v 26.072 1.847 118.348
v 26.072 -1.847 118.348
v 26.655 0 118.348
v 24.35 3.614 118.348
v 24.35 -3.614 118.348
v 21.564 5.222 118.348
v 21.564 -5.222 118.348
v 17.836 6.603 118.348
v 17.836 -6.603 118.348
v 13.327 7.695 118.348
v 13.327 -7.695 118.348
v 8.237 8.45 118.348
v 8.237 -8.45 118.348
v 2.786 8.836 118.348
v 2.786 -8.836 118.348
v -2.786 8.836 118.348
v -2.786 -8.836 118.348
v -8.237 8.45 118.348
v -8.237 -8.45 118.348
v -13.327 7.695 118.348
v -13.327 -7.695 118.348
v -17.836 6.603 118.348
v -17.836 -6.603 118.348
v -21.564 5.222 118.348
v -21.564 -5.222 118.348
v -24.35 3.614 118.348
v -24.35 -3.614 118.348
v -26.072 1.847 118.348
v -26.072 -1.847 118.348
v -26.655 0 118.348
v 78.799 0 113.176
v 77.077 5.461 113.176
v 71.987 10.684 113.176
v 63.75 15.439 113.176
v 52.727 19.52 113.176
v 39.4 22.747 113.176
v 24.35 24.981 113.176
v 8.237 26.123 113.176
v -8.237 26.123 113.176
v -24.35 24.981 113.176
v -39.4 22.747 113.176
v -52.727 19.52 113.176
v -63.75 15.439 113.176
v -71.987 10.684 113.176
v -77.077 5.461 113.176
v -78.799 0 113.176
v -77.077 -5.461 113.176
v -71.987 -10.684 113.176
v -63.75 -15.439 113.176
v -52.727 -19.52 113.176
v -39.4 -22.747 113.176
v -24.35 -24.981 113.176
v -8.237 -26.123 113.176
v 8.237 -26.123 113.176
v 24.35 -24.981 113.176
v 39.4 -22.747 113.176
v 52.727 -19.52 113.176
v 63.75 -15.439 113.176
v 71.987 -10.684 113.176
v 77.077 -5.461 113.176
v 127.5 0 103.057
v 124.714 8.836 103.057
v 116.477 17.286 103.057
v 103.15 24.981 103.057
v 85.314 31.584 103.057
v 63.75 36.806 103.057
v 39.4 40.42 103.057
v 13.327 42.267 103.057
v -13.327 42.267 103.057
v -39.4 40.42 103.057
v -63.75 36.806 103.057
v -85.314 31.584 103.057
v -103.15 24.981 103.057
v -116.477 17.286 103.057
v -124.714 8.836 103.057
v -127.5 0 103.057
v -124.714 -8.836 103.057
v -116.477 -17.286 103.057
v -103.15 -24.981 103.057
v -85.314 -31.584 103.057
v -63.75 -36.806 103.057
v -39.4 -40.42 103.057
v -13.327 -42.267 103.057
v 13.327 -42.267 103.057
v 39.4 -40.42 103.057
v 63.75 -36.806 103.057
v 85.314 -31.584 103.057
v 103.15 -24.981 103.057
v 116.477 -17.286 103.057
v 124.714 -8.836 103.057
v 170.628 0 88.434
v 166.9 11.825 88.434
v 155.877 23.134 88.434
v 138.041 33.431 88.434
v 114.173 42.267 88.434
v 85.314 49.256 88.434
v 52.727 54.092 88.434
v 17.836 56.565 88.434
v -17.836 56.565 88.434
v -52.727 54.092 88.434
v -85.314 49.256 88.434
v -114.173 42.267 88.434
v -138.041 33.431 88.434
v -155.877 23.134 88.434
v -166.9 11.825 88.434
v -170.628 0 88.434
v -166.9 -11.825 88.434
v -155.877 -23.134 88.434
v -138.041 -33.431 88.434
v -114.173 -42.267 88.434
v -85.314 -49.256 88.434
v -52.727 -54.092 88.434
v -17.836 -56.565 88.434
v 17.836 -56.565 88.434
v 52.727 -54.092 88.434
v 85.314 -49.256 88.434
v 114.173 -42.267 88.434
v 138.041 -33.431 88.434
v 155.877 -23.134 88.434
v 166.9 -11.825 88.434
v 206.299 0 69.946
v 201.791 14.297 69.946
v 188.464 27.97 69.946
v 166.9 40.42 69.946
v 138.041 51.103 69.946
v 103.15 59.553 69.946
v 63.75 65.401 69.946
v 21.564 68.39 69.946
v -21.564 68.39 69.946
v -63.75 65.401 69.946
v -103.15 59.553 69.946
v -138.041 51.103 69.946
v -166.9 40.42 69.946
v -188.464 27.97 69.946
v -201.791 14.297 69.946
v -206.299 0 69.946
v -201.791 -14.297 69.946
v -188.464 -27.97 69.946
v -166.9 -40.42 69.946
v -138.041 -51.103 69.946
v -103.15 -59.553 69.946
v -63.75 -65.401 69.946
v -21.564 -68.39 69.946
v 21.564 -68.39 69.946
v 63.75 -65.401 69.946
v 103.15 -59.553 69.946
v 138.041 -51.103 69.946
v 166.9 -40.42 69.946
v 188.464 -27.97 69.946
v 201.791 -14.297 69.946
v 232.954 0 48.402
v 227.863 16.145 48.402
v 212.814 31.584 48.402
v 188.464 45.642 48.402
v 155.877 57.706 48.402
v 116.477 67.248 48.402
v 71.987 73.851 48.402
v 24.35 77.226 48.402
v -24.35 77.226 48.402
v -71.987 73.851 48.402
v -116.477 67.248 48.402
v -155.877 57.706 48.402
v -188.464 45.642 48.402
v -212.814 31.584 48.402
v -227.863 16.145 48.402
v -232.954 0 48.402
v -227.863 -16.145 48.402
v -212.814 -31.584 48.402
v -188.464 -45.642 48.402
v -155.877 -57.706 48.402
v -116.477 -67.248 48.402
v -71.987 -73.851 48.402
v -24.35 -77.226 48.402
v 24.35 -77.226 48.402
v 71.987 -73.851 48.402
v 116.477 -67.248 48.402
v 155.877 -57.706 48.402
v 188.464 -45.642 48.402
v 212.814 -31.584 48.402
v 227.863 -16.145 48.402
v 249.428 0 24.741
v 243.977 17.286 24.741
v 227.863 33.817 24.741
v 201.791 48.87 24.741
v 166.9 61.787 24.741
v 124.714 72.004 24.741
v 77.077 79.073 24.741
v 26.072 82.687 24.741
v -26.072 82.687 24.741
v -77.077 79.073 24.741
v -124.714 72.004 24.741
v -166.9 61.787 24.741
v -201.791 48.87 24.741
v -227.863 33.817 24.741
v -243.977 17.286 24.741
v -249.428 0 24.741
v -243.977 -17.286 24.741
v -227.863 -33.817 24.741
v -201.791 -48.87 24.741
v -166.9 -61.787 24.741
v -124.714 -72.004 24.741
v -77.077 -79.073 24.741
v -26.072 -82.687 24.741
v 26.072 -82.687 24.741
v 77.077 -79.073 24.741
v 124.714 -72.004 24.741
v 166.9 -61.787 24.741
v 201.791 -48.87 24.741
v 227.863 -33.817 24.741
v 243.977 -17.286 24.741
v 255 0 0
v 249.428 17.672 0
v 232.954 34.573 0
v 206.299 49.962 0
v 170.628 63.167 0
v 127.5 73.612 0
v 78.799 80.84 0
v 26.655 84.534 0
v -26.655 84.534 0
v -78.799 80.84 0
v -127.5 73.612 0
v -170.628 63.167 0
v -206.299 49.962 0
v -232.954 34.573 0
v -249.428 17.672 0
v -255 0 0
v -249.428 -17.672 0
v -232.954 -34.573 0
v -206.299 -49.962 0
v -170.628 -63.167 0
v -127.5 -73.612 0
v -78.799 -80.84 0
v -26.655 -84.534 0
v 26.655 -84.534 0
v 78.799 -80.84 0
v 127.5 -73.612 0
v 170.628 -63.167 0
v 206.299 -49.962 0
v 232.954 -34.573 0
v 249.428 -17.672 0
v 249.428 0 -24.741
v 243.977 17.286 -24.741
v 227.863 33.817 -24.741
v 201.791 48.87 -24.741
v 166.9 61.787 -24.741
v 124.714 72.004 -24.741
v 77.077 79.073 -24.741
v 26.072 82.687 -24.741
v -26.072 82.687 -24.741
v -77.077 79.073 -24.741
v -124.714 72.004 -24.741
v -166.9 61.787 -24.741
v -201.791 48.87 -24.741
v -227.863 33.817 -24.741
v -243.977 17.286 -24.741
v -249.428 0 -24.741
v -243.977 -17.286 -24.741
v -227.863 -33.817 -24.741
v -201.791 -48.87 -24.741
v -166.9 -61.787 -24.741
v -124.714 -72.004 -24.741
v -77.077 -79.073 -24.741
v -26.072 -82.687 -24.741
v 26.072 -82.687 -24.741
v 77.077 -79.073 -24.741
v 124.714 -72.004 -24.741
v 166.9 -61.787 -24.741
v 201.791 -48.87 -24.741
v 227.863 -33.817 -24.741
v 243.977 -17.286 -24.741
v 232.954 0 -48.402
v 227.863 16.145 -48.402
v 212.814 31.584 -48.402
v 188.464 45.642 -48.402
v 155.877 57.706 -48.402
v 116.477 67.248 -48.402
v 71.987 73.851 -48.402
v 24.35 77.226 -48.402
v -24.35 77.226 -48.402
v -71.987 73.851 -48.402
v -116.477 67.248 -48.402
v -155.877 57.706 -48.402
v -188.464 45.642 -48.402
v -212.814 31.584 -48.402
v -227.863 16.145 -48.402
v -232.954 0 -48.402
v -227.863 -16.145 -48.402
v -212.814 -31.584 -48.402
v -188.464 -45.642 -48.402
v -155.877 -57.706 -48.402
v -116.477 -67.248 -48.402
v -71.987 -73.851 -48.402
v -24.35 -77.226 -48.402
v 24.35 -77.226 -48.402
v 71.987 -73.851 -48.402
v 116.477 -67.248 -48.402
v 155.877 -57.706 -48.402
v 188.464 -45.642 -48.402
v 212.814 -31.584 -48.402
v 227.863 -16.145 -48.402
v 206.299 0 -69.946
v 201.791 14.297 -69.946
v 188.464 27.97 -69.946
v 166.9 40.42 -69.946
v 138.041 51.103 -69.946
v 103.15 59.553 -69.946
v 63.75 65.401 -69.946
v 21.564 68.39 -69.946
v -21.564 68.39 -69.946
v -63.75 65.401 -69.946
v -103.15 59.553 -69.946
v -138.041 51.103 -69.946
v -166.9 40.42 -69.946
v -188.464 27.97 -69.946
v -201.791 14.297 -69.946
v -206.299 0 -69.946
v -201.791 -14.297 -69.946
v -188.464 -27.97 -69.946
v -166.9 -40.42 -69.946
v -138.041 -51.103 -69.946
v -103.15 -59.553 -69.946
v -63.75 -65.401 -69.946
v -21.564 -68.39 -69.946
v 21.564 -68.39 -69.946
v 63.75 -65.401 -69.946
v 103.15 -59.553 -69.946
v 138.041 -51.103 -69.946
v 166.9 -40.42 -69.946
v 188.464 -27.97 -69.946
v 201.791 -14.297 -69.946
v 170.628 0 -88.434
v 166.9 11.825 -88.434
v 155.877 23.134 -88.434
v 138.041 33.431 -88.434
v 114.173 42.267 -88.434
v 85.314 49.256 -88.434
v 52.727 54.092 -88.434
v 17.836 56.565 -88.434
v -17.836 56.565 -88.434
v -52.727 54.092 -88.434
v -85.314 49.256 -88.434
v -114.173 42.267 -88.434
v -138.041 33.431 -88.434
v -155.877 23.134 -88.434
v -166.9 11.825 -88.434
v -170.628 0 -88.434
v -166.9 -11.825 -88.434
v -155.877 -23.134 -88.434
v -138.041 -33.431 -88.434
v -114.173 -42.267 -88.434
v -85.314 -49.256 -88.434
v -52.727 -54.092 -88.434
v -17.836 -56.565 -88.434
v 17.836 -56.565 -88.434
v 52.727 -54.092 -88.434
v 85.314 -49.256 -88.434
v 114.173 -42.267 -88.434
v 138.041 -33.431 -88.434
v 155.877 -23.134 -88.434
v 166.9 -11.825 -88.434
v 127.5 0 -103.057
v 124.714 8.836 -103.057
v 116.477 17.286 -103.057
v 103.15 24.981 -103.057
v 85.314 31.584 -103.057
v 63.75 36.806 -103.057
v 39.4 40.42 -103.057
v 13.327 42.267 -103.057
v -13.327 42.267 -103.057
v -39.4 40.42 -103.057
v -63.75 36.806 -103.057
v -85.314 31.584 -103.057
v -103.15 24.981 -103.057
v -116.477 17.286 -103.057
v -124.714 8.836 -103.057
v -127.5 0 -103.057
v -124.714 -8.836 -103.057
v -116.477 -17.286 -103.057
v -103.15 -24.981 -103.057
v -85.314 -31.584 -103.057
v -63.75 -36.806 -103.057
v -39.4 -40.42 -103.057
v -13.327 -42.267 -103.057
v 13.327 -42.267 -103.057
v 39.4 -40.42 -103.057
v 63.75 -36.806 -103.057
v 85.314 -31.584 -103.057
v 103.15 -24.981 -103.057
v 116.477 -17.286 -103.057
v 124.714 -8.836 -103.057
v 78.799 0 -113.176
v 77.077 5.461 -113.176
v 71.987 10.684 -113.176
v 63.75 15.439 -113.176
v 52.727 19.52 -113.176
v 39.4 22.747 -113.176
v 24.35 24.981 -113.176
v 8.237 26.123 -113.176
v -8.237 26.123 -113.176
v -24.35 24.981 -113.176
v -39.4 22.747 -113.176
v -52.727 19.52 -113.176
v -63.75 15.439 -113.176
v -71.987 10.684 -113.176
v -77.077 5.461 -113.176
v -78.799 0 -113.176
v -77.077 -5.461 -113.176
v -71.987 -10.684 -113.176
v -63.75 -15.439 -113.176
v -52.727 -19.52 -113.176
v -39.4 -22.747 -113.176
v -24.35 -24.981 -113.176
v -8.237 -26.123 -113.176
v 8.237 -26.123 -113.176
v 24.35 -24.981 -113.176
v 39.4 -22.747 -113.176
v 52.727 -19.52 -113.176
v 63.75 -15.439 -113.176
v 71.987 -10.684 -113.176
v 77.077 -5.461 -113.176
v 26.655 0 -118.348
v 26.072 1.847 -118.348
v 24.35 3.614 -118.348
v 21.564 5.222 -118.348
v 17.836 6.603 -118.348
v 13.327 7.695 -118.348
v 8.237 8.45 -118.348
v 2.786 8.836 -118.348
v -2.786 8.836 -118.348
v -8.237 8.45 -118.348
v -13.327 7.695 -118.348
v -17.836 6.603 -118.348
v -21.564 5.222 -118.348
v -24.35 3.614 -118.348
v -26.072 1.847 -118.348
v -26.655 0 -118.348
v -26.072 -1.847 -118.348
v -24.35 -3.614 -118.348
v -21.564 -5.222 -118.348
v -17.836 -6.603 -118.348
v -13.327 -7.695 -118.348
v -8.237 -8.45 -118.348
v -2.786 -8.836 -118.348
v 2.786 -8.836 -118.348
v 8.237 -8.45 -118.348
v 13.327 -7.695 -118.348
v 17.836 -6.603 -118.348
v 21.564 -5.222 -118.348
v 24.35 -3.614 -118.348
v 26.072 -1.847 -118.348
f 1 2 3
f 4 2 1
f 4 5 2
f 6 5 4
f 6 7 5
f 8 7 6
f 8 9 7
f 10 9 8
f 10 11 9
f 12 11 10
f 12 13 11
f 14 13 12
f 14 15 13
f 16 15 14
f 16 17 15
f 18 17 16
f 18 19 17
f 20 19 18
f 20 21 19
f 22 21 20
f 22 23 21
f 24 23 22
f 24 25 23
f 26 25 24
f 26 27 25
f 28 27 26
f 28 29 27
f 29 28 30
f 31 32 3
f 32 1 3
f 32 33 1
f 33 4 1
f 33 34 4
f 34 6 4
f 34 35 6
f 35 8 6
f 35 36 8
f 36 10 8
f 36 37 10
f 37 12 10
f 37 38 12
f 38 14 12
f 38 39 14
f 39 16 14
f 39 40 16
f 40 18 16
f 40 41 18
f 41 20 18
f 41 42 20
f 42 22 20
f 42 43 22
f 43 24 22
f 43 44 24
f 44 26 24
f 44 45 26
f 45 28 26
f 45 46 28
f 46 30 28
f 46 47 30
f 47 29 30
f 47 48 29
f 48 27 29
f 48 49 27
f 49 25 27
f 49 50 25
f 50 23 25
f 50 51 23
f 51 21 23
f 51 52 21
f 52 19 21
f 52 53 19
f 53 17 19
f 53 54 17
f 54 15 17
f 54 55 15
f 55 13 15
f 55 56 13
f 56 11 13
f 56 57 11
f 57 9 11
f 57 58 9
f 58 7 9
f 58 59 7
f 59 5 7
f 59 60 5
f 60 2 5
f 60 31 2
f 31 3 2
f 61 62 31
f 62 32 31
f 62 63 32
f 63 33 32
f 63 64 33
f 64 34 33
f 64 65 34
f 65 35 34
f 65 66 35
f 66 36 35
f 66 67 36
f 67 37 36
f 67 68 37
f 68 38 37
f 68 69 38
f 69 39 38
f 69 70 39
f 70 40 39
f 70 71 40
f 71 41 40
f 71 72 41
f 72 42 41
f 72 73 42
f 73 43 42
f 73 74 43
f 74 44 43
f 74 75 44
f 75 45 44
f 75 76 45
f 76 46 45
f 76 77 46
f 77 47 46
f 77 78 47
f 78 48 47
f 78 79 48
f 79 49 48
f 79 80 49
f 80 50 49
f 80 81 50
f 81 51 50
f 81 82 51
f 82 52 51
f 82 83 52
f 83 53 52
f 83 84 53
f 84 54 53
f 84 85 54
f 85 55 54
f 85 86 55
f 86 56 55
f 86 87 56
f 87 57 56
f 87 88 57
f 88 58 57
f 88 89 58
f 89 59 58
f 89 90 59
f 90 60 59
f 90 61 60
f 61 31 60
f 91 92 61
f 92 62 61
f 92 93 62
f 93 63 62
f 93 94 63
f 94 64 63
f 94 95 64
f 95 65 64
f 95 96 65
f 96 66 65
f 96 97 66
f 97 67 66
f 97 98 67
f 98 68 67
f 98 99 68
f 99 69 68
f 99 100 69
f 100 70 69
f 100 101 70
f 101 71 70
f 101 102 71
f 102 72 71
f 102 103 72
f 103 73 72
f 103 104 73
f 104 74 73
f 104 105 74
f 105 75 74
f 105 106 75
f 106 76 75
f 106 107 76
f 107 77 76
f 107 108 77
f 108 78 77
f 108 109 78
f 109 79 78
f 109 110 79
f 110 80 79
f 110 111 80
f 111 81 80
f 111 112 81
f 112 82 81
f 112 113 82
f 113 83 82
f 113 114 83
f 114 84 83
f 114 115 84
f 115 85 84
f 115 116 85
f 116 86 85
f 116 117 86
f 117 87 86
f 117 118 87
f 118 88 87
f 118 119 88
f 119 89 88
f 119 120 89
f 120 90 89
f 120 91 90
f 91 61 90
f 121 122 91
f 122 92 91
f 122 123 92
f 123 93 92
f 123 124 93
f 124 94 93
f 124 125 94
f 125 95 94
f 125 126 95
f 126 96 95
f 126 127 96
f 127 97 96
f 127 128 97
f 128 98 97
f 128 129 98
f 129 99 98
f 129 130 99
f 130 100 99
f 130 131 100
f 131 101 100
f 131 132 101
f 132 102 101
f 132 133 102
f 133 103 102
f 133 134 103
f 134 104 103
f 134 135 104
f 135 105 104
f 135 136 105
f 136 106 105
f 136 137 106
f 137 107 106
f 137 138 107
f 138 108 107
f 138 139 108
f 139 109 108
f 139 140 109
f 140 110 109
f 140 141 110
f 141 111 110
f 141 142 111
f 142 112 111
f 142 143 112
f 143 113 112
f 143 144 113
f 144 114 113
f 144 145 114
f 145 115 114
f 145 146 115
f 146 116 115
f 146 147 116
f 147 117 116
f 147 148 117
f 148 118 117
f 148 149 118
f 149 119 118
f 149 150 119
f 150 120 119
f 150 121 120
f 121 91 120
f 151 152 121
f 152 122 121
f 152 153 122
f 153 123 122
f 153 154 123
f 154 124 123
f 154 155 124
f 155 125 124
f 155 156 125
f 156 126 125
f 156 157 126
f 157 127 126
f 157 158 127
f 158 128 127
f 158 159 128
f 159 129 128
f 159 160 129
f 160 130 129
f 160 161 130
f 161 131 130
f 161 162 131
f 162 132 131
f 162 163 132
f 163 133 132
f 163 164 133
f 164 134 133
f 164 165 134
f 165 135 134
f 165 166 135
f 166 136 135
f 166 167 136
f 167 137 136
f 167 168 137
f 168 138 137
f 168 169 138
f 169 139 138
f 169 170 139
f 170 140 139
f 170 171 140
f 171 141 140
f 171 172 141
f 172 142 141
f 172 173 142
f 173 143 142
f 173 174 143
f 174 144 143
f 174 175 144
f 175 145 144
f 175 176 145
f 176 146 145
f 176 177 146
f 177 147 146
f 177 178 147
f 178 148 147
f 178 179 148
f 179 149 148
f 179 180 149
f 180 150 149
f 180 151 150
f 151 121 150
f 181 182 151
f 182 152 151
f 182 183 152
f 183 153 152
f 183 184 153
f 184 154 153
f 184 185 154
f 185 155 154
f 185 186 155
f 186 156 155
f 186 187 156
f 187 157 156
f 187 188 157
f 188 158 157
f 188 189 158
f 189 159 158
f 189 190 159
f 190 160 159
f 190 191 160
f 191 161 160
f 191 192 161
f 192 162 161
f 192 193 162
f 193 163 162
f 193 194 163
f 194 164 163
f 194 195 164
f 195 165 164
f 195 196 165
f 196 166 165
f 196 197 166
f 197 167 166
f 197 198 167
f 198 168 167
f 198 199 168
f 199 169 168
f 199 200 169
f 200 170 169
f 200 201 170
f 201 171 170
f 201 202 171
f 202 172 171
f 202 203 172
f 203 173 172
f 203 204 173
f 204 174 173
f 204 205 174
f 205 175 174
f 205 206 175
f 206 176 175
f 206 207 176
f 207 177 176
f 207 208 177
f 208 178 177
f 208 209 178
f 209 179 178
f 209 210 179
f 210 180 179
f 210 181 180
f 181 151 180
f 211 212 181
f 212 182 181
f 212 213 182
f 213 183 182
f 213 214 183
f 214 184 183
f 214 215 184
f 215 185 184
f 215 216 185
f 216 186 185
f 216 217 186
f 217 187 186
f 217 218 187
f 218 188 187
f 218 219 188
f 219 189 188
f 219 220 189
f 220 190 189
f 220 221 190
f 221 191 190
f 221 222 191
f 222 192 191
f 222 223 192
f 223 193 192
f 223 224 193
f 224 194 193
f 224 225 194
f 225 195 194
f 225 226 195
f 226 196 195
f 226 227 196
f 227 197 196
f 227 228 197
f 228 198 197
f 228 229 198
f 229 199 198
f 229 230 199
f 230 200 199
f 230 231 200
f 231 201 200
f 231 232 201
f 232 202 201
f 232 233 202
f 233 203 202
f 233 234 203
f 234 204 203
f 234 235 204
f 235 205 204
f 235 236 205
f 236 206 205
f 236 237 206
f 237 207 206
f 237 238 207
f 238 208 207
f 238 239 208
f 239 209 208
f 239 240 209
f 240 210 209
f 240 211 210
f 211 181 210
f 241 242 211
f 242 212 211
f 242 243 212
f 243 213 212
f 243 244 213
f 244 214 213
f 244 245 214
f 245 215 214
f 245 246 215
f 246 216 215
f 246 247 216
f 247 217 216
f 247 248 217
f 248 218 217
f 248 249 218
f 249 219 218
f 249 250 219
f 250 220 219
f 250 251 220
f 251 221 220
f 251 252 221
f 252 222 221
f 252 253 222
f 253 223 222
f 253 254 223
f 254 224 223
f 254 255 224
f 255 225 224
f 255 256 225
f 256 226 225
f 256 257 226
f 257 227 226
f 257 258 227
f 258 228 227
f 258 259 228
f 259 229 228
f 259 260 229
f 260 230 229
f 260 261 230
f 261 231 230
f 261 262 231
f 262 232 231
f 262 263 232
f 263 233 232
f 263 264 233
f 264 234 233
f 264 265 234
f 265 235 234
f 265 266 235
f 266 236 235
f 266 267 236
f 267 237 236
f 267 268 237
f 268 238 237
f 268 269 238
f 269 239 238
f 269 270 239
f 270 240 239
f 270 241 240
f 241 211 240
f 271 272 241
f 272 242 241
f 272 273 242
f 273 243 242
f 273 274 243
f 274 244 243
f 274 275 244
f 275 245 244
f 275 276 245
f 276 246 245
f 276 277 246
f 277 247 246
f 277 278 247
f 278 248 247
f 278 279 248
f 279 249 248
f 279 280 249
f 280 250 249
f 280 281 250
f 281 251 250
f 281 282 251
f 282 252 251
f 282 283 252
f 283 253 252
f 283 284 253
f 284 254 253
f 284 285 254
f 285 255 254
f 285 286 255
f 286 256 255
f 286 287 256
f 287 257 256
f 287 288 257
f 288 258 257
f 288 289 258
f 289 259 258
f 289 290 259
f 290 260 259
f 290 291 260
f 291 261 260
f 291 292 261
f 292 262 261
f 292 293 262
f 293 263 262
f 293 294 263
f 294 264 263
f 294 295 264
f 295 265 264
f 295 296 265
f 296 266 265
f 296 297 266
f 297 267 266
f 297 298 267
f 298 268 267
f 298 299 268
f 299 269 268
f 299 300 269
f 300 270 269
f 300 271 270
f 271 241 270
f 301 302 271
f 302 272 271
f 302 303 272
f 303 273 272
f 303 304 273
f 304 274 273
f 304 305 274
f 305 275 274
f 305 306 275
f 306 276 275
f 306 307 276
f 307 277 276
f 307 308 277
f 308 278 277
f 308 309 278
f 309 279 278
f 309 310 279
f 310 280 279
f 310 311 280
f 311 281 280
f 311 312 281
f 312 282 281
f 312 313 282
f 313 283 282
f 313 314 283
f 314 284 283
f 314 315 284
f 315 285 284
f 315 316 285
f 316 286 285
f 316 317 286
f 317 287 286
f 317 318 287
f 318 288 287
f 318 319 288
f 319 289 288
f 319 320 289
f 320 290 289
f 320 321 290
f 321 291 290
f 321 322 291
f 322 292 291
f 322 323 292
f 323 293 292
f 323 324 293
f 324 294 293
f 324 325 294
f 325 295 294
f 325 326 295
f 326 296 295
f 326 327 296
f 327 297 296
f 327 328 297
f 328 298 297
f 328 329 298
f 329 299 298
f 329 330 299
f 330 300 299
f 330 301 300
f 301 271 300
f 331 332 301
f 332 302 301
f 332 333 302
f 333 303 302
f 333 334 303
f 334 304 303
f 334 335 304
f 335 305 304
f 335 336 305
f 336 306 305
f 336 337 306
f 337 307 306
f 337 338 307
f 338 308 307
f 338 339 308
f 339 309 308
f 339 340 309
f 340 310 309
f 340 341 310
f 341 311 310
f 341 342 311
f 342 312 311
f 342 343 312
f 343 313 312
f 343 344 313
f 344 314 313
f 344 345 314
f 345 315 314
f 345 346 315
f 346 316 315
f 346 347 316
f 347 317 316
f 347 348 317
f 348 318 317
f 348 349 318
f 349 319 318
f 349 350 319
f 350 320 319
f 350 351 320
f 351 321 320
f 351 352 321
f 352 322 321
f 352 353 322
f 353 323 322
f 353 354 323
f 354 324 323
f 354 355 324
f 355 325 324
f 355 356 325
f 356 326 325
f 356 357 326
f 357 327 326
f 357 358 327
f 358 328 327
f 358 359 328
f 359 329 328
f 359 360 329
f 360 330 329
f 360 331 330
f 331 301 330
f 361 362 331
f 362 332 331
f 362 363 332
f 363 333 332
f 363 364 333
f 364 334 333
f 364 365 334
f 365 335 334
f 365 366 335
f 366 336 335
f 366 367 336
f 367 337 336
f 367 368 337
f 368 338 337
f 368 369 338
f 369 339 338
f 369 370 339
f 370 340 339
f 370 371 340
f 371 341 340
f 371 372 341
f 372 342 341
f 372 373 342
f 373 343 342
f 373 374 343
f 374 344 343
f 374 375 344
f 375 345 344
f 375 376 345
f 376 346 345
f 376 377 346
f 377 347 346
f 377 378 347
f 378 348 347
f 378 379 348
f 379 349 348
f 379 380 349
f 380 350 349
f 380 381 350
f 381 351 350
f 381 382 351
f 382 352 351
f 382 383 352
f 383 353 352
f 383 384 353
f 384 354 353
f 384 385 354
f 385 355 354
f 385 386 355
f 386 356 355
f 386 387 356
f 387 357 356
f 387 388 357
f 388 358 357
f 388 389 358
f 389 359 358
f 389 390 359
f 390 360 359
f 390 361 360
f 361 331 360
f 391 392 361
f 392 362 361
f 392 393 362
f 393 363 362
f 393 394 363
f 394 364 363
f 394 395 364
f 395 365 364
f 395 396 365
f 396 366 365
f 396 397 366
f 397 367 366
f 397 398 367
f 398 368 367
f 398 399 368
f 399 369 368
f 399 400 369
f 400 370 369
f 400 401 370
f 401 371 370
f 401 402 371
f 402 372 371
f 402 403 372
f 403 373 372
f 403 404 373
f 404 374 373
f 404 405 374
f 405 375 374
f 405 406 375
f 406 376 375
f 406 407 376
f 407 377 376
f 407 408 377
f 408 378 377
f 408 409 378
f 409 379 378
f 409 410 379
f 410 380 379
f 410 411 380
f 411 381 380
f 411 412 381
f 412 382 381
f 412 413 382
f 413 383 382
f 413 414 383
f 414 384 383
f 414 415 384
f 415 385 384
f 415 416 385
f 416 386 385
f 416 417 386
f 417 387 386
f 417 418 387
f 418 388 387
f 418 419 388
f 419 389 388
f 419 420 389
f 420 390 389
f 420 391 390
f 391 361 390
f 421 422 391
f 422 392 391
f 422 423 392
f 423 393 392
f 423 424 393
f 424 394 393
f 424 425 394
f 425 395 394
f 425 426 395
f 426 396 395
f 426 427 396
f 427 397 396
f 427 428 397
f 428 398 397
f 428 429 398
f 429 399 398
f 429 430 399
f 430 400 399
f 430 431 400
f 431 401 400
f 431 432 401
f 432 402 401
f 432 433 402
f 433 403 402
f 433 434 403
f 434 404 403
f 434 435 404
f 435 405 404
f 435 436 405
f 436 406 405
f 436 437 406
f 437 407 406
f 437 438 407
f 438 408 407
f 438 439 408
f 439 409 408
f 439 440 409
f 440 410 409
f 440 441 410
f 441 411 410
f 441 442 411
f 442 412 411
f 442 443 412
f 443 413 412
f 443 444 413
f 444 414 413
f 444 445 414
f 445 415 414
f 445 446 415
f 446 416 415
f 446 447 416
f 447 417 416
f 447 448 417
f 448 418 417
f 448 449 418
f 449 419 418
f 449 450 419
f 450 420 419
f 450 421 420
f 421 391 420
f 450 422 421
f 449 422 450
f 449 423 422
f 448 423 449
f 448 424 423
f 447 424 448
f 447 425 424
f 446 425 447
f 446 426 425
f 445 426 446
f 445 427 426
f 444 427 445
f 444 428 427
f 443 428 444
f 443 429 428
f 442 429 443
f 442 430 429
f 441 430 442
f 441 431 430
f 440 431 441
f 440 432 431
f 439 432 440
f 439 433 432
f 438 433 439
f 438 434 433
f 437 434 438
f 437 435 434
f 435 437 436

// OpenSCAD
// Generated by SolidPython 1.0.1 on 2020-07-29 00:46:51


scale(v = [15, 5, 7]) {
	sphere(r = 17);
}
/***********************************************
*********      SolidPython code:      **********
************************************************
 
# import packages: SolidPython
from solid import *
from solid.utils import *
from itertools import chain, combinations, permutations


class Resize:

    def __init__(self, scad_file):
        self.scad_file = scad_file
        #self.scad_file = import_scad(scad_file)
        # cone/cylinder param:
        self.r1 = 0
        self.r2 = 0
        self.h = 0
        # rectangular prism param:
        self.w = 0
        self.l = 0
        # ellipse param:
        self.r = 0

    # import OpenScad code (file name corresponds to shape)


    # classify shape + parameters
    def assign(self, param1, param2, param3):
        if self.scad_file == 'cone.scad':
            self.r1 = param1
            self.r2 = param2
            self.h = param3
        elif self.scad_file == 'cylinder.scad':
            self.r1 = param1
            self.r2 = param2
            self.h = param3
        elif self.scad_file == 'rectangularPrism.scad':
            self.h = param1
            self.l = param2
            self.w = param3
        else:
            self.r = param1
            self.h = param2

    # resize parameters
    def iterate(self):
        x = range(3, 20, 2)
        i = 1
        if self.scad_file == 'cone.scad':
            tempList = list(permutations(x, 2))
            for temp in tempList:
                param1 = temp[0]
                param2 = temp[1]
                filepath = 'produced_scad_files/' + 'cone' + str(param1) + '_' + str(param2) + '_' + '.scad'
                scad_render_to_file(cylinder(h=param1, r1=param2, r2=0), filepath)

        elif self.scad_file == 'cylinder.scad':
            tempList = list(permutations(x, 3))
            for temp in tempList:
                param1 = temp[0]
                param2 = temp[1]
                filepath = 'produced_scad_files/' + 'cylinder' + str(param1) + '_' + str(param2) + '_' + '.scad'
                scad_render_to_file(cylinder(h=param1, r1=param2, r2=param2), filepath)

        elif self.scad_file == 'rectangularPrism.scad':
            tempList = list(permutations(x, 3))
            for temp in tempList:
                param1 = temp[0]
                param2 = temp[1]
                param3 = temp[2]
                filepath = 'produced_scad_files/' + 'rectangularPrism' + str(param1) + '_' + str(param2) + '_' + str(
                    param3) + '.scad'
                scad_render_to_file(cube(size=(param1, param2, param3)), filepath)

        elif self.scad_file == 'ellipse.scad':
            tempList = list(permutations(x, 4))
            for temp in tempList:
                param1 = temp[0]
                param2 = temp[1]
                param3 = temp[2]
                param4 = temp[3]
                filepath = 'produced_scad_files/' + 'ellipse' + str(param1) + '_' + str(param2) + '_' + str(param3) + '_' + str(param4) + '.scad'
                scad_render_to_file(scale([param1, param2, param3])(sphere(r=param4)), filepath)

    def render_to_scadfile(self):
        scad_render_to_file(scad, 'example.scad') 
 
************************************************/
